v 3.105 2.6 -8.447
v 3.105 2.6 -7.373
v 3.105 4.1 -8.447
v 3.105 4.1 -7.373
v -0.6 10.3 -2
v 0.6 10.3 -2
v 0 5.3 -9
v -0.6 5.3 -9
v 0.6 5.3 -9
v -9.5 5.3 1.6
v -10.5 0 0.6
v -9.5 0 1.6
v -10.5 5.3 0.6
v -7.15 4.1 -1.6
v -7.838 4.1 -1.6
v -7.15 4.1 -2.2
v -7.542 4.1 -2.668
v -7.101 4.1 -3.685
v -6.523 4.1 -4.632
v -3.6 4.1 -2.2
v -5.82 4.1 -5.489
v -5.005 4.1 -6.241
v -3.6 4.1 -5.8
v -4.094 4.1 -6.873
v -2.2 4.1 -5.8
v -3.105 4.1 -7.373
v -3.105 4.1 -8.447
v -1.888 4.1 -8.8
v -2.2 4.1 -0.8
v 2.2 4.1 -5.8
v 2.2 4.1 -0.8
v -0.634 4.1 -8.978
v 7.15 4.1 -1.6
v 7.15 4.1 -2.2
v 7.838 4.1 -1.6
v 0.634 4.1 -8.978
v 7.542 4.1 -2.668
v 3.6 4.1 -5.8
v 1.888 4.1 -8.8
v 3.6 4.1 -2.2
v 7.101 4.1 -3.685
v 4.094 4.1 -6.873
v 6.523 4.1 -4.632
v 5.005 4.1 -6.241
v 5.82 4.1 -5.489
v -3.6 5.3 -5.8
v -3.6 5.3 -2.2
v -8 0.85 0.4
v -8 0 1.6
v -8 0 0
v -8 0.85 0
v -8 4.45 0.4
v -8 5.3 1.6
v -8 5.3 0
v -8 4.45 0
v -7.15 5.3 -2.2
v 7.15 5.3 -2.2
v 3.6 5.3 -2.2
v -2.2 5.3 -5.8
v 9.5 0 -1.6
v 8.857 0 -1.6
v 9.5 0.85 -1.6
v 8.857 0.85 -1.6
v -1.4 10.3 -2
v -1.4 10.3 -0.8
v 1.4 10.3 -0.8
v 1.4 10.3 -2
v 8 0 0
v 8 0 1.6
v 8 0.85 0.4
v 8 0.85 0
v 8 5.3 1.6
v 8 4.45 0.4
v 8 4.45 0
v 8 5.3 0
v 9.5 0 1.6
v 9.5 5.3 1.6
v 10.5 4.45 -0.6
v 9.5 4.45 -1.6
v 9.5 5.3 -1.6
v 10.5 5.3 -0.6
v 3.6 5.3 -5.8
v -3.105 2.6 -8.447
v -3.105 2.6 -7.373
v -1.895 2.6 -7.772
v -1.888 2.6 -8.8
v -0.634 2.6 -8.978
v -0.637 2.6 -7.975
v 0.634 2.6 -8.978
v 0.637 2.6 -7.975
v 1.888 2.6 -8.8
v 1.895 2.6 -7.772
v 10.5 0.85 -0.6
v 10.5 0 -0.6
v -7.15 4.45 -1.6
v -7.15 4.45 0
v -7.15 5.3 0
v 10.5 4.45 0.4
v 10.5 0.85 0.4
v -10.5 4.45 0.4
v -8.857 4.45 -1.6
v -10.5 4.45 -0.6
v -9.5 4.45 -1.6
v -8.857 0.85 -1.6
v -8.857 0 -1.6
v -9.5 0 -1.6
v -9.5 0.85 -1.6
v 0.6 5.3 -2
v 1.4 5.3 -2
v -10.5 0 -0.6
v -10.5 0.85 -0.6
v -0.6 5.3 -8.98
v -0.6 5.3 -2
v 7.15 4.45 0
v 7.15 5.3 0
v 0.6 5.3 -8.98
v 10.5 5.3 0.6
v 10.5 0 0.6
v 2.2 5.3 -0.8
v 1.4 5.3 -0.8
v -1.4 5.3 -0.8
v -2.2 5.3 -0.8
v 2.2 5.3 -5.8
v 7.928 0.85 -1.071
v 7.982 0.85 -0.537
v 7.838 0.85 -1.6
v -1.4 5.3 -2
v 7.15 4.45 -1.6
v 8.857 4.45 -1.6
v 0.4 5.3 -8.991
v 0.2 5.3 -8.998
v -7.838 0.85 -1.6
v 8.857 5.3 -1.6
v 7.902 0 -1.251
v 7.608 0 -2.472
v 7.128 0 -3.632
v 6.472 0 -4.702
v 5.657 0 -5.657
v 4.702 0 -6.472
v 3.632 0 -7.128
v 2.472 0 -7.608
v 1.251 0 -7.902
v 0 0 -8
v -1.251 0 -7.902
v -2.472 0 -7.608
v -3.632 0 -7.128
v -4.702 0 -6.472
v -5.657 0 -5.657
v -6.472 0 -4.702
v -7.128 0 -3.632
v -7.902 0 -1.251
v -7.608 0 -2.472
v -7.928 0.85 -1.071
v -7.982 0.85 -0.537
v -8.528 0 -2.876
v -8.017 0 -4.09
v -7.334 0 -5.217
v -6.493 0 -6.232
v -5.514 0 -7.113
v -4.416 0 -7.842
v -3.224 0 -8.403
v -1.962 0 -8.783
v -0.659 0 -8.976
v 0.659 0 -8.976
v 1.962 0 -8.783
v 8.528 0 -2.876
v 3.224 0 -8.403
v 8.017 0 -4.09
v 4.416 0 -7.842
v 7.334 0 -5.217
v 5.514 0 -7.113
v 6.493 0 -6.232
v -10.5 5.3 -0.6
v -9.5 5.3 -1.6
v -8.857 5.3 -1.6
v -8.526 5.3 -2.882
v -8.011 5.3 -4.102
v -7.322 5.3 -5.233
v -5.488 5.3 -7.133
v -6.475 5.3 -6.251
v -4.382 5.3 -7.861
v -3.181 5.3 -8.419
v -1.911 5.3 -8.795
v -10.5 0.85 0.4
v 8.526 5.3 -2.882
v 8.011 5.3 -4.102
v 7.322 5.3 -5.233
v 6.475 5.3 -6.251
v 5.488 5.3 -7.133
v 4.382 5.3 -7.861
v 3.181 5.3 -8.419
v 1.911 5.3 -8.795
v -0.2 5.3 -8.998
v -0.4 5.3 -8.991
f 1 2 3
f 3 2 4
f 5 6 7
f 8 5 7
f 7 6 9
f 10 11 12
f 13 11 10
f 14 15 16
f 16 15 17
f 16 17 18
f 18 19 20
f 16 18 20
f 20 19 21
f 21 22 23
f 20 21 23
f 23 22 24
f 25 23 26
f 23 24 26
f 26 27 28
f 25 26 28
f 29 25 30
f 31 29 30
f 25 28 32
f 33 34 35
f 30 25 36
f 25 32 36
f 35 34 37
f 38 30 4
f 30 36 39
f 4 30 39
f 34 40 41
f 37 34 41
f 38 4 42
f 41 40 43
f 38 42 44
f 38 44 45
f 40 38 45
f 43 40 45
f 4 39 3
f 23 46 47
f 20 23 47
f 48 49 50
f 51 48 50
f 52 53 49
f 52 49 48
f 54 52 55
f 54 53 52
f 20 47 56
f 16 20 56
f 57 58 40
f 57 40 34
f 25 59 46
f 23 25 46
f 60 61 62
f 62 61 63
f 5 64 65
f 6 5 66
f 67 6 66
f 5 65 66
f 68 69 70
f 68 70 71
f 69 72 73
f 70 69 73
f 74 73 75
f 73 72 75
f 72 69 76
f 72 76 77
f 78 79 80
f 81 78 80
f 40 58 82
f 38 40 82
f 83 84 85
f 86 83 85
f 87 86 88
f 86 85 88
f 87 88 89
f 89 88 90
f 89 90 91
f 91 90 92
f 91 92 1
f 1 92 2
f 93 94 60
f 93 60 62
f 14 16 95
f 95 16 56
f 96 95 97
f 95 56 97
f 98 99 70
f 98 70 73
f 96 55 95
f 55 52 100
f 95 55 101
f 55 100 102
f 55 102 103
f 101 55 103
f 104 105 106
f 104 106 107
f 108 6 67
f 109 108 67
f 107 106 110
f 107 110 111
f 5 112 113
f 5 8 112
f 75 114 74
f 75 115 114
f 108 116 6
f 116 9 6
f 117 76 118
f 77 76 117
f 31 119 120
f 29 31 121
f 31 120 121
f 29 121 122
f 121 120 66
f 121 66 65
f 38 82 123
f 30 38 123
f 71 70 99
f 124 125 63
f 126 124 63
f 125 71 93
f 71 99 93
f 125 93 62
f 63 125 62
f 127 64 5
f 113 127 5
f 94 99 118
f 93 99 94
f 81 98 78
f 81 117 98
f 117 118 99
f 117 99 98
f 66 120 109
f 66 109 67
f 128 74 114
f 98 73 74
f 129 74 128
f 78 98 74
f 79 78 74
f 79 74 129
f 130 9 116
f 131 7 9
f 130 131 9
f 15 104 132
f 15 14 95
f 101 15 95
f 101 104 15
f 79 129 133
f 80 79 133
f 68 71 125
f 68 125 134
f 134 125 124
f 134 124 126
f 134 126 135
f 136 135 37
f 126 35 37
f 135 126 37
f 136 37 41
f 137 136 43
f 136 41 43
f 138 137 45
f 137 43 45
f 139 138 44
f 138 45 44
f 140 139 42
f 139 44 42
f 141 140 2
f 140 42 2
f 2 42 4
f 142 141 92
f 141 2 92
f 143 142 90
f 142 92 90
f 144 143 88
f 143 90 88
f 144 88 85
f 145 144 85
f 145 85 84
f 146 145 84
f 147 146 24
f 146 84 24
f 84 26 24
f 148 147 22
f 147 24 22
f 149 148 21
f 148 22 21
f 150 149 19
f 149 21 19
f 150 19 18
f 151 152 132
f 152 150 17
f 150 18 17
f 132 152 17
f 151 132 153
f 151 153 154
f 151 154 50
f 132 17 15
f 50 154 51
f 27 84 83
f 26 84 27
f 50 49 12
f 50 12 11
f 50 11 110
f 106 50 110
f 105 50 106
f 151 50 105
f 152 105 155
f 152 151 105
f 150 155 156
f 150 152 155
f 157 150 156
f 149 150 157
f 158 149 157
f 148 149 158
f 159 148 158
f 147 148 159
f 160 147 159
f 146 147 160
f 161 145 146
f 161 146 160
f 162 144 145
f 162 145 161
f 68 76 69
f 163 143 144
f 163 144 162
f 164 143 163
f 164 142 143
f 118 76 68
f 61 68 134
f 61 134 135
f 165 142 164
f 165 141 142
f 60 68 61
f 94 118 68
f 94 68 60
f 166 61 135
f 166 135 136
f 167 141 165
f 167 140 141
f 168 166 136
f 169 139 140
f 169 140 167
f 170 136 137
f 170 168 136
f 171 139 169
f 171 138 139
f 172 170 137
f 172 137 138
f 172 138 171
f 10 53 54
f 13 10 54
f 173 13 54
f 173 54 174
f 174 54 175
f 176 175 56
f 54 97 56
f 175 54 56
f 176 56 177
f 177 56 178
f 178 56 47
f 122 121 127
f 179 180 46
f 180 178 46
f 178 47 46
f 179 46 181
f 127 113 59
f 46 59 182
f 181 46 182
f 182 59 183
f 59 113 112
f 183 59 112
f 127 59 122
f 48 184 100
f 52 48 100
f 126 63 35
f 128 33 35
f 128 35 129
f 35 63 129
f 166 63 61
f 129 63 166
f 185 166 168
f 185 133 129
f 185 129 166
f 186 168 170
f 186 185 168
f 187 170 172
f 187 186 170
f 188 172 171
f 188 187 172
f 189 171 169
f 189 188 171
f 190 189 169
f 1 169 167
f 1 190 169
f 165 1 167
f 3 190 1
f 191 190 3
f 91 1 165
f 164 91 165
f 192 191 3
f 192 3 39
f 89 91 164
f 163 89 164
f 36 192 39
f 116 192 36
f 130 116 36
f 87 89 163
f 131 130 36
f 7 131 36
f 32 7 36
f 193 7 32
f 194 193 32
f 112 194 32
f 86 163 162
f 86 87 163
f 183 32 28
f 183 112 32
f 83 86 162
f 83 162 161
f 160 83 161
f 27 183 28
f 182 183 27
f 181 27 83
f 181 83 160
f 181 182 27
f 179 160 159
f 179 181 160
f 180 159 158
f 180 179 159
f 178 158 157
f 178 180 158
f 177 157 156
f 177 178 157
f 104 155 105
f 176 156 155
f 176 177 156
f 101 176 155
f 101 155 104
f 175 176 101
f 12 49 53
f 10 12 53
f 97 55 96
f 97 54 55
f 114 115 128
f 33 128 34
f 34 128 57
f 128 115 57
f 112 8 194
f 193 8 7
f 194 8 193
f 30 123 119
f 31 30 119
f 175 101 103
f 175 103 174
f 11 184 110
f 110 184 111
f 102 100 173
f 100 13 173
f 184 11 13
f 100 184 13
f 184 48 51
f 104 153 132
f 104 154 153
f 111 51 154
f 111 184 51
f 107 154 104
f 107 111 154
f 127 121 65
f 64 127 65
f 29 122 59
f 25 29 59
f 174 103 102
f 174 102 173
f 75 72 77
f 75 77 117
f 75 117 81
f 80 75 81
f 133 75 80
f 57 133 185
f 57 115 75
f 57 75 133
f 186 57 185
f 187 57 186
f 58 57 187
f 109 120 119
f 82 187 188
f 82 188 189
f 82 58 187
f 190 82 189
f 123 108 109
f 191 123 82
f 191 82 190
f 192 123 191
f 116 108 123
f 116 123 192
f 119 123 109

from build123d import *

# Parameters (mm, degrees)
SKETCH1_W           = 8
SKETCH1_H           = 1.2
SKETCH1_W_2         = 1
SKETCH1_H_2         = 4.1
REVOLVE1_ANGLE      = 180
SKETCH2_W           = 6.21
SKETCH2_H           = 1.5
CUT_EXTRUDE1_DEPTH  = 14.787313009
CUT_EXTRUDE2_DEPTH  = 14.787313009
SKETCH4_W           = 3.4
SKETCH4_H           = 2
BOSS_EXTRUDE1_DEPTH = 1.2
SKETCH6_W           = 2.8
SKETCH6_H           = 5
BOSS_EXTRUDE3_DEPTH = 1.2
BOSS_EXTRUDE4_DEPTH = 0.6
SKETCH8_W           = 4.65
SKETCH8_H           = 2.2
SKETCH8_W_2         = 16.704991512
SKETCH8_H_2         = 4.40240097
CUT_EXTRUDE3_DEPTH  = 10
SKETCH5_W           = 3.2
SKETCH5_H           = 5.3
BOSS_EXTRUDE5_DEPTH = 2.5
SKETCH9_W           = 2
SKETCH9_H           = 3.6
CUT_EXTRUDE4_DEPTH  = 5
CHAMFER1_SIZE       = 1


with BuildPart() as part:
    # Sketch1 → Revolve1 (revolve)
    with BuildSketch(Plane.XY):
        with Locations((4, 4.7)):
            Rectangle(SKETCH1_W, SKETCH1_H)
        with Locations((8.5, 4.7)):
            Rectangle(SKETCH1_W_2, SKETCH1_H)
        with Locations((8.5, 2.05)):
            Rectangle(SKETCH1_W_2, SKETCH1_H_2)
    revolve(axis=Axis((0, 0, 0), (0, 1, 0)), revolution_arc=REVOLVE1_ANGLE)

    # Sketch2 → Cut-Extrude1 (cut, through all)
    with BuildSketch(Plane.XY):
        with Locations((0, 3.35)):
            Rectangle(SKETCH2_W, SKETCH2_H)
    extrude(amount=-CUT_EXTRUDE1_DEPTH, mode=Mode.SUBTRACT)

    # Sketch3 → Cut-Extrude2 (cut, through all)
    with BuildSketch(Plane(origin=(0, 5.3, 0), x_dir=(1, 0, 0), z_dir=(0, 1, 0))):
        Polygon((-2.2, 5.8), (-3.6, 5.8), (-3.6, 0), (3.6, 0), (3.6, 5.8), (2.2, 5.8), (2.2, 0.8), (-2.2, 0.8), align=None)
    extrude(amount=-CUT_EXTRUDE2_DEPTH, mode=Mode.SUBTRACT)

    # Sketch4 → Boss-Extrude1 (add)
    with BuildSketch(Plane(origin=(0, 5.3, 0), x_dir=(1, 0, 0), z_dir=(0, 1, 0))):
        with Locations((5.3, -1)):
            Rectangle(SKETCH4_W, SKETCH4_H)
        with Locations((-5.3, -1)):
            Rectangle(SKETCH4_W, SKETCH4_H)
    extrude(amount=-BOSS_EXTRUDE1_DEPTH)

    # Sketch6 → Boss-Extrude3 (add)
    with BuildSketch(Plane.XY.offset(-0.8)):
        with Locations((0, 7.8)):
            Rectangle(SKETCH6_W, SKETCH6_H)
    extrude(amount=-BOSS_EXTRUDE3_DEPTH)

    # Sketch7 → Boss-Extrude4 (add, symmetric)
    with BuildSketch(Plane(origin=(0, 0, 0), x_dir=(0, 0, -1), z_dir=(1, 0, 0))):
        Polygon((2, 10.3), (9, 5.3), (2, 5.3), align=None)
    extrude(amount=BOSS_EXTRUDE4_DEPTH, both=True)

    # Sketch8 → Cut-Extrude3 (cut)
    with BuildSketch(Plane(origin=(0, 5.3, 0), x_dir=(1, 0, 0), z_dir=(0, 1, 0))):
        Polygon((-3.6, 0), (-3.6, 2.2), (-7.15, 2.2), (-7.15, 0), (-7, 0), align=None)
        with Locations((4.825, 1.1)):
            Rectangle(SKETCH8_W, SKETCH8_H)
        with Locations((1.202495756, -2.201200485)):
            Rectangle(SKETCH8_W_2, SKETCH8_H_2)
    extrude(amount=-CUT_EXTRUDE3_DEPTH, mode=Mode.SUBTRACT)

    # Sketch5 → Boss-Extrude5 (add)
    with BuildSketch(Plane(origin=(8, 0, 0), x_dir=(0, 0, -1), z_dir=(1, 0, 0))):
        with Locations((0, 2.65)):
            Rectangle(SKETCH5_W, SKETCH5_H)
    boss_extrude5 = extrude(amount=BOSS_EXTRUDE5_DEPTH)

    # Sketch9 → Cut-Extrude4 (cut)
    with BuildSketch(Plane(origin=(10.5, 0, 0), x_dir=(0, 0, -1), z_dir=(1, 0, 0))):
        with Locations((0.6, 2.65)):
            Rectangle(SKETCH9_W, SKETCH9_H)
    cut_extrude4 = extrude(amount=-CUT_EXTRUDE4_DEPTH, mode=Mode.SUBTRACT)

    # Mirror1: Boss-Extrude5, Cut-Extrude4 across plane
    add(boss_extrude5.mirror(Plane(origin=(0, 0, 0), x_dir=(0, 0, 1), z_dir=(1, 0, 0))))
    add(cut_extrude4.mirror(Plane(origin=(0, 0, 0), x_dir=(0, 0, 1), z_dir=(1, 0, 0))), mode=Mode.SUBTRACT)

    # Chamfer1
    chamfer1_edges = [part.edges().sort_by_distance(p)[0] for p in [
        (10.5, 4.875, -1.6),
        (10.5, 2.65, 1.6),
        (10.5, 0.425, -1.6),
        (-10.5, 2.65, 1.6),
        (-10.5, 4.875, -1.6),
        (-10.5, 0.425, -1.6),
    ]]
    chamfer(chamfer1_edges, length=CHAMFER1_SIZE)


solid = part.part
